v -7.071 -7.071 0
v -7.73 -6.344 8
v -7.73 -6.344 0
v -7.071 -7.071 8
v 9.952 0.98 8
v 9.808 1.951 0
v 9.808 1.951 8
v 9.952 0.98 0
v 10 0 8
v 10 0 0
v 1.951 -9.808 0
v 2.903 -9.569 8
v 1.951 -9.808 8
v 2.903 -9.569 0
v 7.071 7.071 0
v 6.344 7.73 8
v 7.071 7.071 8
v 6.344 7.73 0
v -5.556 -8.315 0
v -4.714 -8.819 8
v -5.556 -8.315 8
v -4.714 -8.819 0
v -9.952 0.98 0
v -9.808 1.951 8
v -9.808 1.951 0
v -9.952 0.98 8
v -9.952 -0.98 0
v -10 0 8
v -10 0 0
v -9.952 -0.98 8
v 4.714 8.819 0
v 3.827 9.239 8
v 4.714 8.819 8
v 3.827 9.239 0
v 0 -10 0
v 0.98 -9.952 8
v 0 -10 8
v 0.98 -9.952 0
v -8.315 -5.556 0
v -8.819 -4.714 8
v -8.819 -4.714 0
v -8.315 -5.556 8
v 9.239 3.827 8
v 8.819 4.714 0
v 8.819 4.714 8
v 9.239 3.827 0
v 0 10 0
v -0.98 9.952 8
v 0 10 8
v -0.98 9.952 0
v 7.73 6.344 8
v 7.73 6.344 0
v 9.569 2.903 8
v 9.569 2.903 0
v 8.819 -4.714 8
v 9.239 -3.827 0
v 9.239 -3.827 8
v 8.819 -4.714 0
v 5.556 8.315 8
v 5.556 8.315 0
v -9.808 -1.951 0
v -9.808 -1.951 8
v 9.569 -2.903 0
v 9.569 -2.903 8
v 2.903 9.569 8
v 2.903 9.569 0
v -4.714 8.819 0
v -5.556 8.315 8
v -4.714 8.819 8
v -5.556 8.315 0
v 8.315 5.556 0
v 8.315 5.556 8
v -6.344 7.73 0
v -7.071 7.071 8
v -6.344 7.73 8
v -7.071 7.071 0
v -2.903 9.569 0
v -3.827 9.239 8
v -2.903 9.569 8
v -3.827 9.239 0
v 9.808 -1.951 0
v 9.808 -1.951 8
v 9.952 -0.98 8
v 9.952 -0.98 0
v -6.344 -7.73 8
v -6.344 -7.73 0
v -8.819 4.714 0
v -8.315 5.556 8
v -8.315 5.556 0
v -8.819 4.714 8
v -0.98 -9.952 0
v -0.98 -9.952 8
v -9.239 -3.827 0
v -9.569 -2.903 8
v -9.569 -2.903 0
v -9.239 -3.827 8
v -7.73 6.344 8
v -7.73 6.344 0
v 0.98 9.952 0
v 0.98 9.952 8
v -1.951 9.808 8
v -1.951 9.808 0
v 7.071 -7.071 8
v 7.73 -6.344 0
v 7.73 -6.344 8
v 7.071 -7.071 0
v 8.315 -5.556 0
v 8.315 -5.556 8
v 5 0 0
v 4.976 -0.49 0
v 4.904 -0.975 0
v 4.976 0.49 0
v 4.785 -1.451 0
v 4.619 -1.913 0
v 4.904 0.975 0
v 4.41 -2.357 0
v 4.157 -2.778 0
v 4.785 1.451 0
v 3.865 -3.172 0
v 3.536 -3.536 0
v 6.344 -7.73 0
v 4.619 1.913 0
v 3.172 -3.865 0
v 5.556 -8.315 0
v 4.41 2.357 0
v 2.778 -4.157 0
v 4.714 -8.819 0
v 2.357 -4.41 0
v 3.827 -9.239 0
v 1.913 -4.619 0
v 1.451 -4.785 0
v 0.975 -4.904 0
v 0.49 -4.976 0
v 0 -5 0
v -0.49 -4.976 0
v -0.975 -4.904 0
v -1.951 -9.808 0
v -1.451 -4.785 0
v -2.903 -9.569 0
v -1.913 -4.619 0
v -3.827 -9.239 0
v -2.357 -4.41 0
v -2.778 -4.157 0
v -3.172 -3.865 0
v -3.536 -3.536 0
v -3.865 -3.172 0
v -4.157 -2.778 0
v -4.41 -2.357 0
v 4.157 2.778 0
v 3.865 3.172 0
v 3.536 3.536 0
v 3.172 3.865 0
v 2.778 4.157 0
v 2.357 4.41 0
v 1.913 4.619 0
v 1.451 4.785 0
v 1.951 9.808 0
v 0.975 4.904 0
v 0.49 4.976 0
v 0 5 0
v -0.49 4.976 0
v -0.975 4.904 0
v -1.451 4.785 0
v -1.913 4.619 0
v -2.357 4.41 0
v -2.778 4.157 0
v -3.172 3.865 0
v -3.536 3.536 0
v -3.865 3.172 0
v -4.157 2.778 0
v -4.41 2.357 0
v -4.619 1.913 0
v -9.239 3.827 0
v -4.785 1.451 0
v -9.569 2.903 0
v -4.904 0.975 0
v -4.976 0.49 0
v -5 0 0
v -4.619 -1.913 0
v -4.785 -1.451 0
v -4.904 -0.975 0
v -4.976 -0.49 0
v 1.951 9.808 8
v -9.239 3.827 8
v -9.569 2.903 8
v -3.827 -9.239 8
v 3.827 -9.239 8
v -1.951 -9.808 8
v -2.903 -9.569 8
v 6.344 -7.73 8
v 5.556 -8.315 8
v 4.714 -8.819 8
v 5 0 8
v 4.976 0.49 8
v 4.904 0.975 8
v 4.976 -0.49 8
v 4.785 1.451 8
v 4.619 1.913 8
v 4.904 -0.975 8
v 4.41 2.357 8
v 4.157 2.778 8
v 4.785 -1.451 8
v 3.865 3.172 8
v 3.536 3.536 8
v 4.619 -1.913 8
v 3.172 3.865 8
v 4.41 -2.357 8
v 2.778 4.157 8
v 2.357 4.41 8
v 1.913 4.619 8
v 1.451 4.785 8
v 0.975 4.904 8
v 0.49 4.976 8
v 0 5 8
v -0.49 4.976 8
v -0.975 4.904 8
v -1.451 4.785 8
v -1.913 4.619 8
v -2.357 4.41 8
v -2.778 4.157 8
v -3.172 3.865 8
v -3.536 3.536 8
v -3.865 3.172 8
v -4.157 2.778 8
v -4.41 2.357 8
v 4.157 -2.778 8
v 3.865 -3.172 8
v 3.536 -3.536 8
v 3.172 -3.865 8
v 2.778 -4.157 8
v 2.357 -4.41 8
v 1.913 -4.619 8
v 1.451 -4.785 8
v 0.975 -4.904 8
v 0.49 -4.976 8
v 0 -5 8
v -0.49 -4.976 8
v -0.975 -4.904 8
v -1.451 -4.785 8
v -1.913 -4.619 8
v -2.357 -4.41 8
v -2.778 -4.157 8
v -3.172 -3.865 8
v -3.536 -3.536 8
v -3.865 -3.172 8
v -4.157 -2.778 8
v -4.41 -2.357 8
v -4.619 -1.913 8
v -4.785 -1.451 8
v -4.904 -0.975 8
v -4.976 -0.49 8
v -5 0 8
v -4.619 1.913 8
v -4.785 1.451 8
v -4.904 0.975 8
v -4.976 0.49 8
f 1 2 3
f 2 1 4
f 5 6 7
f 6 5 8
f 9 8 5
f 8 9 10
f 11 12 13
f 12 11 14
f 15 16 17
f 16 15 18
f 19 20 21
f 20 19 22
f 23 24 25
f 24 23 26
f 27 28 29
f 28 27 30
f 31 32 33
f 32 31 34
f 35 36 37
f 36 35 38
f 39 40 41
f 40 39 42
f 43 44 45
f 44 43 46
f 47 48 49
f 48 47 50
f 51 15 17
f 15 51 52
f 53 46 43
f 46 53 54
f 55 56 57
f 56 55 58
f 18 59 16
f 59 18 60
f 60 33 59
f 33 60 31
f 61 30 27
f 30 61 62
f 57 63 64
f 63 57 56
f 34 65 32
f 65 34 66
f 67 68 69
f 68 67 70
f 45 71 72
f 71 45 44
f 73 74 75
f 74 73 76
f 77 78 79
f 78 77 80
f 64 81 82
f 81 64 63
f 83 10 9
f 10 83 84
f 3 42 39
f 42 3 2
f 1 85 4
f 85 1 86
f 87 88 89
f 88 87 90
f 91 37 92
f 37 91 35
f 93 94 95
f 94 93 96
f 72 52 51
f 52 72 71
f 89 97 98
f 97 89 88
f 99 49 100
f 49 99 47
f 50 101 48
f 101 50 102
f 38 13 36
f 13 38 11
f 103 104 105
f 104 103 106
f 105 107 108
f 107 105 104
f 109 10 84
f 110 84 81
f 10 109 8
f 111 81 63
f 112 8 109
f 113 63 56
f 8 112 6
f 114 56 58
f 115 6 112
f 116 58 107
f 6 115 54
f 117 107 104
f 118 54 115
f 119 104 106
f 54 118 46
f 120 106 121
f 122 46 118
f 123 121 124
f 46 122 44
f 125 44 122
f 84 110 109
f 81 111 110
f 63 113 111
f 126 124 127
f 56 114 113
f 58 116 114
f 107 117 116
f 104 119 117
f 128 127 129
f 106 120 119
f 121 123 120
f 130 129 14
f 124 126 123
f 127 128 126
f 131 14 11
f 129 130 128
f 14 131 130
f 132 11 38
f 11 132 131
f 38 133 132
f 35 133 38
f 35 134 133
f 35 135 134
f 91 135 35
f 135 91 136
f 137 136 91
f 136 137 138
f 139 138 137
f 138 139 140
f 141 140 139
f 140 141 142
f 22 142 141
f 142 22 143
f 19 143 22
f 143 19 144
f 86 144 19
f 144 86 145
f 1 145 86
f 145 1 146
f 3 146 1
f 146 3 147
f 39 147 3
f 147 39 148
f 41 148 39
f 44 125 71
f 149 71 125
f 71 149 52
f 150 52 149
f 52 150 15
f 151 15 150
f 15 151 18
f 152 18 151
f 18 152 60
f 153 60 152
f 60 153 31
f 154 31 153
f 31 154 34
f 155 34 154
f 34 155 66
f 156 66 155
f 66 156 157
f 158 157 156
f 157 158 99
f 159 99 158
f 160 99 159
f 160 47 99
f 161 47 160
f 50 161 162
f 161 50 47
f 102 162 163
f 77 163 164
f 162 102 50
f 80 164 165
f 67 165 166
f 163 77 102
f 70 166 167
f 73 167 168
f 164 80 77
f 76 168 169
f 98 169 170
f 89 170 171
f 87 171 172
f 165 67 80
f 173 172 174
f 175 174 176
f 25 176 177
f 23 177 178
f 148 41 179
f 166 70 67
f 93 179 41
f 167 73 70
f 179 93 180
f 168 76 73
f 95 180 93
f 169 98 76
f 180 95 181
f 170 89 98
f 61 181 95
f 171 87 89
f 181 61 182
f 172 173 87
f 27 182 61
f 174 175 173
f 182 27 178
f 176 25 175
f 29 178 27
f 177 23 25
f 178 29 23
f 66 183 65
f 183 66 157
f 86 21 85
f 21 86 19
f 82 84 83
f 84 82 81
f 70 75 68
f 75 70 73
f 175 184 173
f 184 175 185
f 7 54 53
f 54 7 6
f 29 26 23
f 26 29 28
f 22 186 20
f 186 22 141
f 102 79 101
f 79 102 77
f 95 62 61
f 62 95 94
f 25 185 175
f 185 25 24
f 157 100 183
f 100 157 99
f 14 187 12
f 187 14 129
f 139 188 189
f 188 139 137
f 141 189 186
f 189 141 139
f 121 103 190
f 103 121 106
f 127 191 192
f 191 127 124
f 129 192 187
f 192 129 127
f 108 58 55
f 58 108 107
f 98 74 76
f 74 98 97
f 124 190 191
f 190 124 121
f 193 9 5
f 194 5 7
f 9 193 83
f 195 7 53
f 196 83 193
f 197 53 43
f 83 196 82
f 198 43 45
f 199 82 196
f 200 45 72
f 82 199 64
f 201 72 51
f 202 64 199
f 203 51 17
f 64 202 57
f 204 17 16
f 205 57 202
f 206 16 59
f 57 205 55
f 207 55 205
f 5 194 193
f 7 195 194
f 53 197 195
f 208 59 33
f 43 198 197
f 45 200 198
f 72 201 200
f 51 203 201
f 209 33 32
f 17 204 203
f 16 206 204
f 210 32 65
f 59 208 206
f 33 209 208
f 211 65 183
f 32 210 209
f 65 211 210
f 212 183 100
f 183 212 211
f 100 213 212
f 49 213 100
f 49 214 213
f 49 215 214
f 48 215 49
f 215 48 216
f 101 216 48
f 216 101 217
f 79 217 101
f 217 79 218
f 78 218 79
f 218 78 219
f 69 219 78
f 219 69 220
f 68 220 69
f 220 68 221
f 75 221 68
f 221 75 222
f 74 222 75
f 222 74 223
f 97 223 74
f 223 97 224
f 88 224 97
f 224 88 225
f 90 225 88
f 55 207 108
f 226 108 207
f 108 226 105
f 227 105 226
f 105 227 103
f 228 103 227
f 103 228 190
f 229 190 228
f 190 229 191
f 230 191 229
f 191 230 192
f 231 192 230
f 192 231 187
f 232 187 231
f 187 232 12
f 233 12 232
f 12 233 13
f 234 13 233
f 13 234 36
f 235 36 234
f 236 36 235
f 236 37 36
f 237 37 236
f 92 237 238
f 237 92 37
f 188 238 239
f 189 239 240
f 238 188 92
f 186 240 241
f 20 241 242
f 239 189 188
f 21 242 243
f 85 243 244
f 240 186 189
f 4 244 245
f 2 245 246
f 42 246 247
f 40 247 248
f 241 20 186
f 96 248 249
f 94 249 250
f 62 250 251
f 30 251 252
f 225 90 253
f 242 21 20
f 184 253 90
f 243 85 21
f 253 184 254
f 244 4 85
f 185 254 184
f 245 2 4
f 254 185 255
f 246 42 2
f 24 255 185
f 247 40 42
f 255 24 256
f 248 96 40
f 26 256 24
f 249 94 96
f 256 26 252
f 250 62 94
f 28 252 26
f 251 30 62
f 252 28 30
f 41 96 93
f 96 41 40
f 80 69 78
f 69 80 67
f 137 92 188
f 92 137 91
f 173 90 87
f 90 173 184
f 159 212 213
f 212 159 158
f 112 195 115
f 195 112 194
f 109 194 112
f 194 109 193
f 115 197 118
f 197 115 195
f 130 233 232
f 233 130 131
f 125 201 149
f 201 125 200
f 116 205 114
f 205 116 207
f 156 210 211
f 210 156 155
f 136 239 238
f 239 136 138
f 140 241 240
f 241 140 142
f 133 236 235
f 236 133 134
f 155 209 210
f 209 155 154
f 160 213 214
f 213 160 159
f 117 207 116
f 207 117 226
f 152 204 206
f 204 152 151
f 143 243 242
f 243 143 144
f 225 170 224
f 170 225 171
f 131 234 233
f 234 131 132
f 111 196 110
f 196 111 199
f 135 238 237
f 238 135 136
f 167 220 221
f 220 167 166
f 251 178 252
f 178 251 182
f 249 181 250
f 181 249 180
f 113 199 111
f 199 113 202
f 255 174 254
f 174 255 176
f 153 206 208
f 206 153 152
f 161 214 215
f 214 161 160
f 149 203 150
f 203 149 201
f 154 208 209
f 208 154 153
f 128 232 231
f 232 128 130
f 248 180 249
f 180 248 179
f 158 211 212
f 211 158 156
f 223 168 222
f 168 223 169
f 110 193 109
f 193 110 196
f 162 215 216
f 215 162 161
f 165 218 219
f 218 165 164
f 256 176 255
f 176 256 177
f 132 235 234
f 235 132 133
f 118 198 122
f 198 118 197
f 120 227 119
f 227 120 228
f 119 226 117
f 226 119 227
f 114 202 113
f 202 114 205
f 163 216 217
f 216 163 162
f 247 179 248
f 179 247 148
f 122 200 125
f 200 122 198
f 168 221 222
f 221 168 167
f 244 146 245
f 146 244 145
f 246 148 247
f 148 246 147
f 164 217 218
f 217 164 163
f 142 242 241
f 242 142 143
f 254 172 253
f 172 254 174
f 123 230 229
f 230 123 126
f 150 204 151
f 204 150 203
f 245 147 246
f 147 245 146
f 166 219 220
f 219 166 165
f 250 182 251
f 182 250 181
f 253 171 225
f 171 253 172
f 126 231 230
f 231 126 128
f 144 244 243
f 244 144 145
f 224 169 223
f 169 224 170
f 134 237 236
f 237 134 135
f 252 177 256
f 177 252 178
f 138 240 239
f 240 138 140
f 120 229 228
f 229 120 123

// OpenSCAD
// bushing_param.scad
// param: inner_d=10, outer_d=20, thickness=8
module param_bushing(inner_d=10, outer_d=20, thickness=8) {
    difference(inner_d=40, outer_d=60, thickness=90) {
        cylinder(h = thickness, r=outer_d/2, $fn=64);
        cylinder(h = thickness+2, r=inner_d/2, $fn=64);
    }
}
param_bushing(inner_d=10, outer_d=20, thickness=8);
